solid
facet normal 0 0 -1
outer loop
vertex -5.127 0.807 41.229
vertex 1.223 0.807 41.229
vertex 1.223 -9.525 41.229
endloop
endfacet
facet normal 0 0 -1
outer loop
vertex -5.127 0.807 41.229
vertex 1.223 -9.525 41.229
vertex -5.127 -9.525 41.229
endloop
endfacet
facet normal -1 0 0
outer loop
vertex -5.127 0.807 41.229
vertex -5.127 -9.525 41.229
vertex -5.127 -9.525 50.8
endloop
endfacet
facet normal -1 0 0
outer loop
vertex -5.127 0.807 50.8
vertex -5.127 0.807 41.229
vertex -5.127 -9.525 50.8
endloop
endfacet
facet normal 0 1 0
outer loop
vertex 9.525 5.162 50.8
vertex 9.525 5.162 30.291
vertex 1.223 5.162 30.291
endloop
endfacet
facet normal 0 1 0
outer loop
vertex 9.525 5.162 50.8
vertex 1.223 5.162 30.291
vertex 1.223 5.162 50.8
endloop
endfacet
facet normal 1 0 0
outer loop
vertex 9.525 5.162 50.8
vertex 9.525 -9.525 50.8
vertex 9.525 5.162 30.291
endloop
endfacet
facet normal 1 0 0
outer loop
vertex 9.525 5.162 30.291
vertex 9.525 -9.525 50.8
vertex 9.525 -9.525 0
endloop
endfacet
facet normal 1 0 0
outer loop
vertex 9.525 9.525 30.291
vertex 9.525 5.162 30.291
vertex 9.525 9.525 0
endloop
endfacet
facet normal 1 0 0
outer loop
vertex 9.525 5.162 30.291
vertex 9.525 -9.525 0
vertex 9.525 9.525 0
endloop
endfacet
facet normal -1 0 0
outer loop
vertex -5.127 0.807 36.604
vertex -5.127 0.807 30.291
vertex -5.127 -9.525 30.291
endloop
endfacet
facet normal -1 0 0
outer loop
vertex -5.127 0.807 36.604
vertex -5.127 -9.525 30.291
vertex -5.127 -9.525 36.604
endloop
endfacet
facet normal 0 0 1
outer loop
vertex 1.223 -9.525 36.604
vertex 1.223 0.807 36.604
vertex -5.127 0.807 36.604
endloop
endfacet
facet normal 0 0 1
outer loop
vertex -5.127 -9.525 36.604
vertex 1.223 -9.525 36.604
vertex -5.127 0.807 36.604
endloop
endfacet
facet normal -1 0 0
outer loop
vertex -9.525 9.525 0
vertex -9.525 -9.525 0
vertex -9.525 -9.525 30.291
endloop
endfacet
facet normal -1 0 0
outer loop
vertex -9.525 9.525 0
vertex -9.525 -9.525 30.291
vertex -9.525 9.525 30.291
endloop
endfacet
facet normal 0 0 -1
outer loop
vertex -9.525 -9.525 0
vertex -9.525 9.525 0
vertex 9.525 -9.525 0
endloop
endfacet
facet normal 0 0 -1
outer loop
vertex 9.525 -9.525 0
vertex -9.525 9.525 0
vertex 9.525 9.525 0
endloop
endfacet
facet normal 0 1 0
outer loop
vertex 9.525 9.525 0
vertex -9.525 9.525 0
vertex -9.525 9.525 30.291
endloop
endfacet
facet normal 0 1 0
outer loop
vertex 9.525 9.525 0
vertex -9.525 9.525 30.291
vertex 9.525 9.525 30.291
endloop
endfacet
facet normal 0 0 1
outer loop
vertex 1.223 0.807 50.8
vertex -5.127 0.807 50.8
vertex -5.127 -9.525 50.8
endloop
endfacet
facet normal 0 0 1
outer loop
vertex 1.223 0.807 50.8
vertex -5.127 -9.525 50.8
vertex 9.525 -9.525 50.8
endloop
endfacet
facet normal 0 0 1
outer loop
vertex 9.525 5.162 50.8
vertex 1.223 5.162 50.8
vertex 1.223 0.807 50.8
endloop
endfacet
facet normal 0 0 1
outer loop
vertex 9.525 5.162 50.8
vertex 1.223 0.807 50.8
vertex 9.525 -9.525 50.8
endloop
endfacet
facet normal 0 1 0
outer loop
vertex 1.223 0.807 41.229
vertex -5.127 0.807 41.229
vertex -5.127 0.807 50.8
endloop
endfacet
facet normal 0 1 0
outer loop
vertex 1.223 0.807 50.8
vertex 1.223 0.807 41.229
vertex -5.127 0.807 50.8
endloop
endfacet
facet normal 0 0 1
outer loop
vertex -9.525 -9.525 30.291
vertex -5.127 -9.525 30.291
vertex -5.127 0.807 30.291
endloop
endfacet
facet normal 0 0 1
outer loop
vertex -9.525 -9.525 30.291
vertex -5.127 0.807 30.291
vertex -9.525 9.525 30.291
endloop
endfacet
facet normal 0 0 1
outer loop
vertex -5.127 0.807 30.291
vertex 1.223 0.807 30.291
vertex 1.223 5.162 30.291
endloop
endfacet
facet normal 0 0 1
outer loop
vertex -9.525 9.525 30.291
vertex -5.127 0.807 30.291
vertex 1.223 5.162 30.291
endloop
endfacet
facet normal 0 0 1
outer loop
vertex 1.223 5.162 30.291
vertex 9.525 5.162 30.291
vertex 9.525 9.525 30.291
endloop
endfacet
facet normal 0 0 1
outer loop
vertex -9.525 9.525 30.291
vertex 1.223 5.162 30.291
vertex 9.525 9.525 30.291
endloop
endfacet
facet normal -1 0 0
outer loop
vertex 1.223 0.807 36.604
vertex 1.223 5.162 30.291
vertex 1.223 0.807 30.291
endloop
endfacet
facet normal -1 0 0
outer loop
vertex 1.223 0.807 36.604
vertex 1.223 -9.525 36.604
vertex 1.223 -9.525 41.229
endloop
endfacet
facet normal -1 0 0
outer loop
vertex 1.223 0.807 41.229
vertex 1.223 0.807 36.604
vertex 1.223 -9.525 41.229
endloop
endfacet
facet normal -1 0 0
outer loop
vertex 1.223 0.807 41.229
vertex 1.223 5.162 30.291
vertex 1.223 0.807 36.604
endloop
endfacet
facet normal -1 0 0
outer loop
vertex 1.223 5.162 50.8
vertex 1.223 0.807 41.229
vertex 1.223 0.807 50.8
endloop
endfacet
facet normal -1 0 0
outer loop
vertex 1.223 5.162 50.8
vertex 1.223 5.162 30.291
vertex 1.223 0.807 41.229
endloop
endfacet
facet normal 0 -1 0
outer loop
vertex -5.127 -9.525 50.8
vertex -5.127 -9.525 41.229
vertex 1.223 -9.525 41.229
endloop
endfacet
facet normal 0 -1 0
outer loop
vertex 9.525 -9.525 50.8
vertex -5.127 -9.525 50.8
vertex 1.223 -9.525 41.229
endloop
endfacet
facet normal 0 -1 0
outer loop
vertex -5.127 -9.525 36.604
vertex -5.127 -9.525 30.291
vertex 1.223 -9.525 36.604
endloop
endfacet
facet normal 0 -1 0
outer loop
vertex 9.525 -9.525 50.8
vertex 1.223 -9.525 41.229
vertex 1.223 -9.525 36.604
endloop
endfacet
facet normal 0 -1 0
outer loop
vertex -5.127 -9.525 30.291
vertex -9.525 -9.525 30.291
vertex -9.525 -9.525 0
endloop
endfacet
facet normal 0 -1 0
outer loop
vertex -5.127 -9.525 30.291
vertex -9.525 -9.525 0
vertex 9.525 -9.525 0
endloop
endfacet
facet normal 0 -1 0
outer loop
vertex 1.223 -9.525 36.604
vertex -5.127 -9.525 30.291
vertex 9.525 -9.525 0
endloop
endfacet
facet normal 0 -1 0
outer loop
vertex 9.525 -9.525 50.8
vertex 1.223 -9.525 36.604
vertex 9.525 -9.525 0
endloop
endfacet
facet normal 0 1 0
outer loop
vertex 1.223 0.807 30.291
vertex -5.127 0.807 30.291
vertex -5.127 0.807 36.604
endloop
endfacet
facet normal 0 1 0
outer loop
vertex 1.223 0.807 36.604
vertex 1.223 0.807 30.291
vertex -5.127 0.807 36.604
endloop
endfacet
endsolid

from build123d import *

# Parameters (mm, degrees)
F0_W     = 19.05
F0_H     = 19.05
F1_DEPTH = 50.8
F2_W     = 4.3630654678
F2_H     = 20.508804819
F3_DEPTH = 25.4
F4_W     = 4.3975393042
F4_H     = 20.508804819
F5_DEPTH = 25.4
F6_W     = 4.3544375803
F6_H     = 20.508804819
F7_DEPTH = 6.35
F8_W     = 6.35
F8_H     = 4.6250596642
F9_DEPTH = 25.4


# Not quite as in the source:
# - a feature names something its author has since deleted; it is built from what else it names


with BuildPart() as f1:
    # F0 (on Top) → F1 (new body)
    with BuildSketch(Plane.XY):
        Rectangle(F0_W, F0_H)
    extrude(amount=F1_DEPTH)

    # F2 (on face) → F3 (cut)
    with BuildSketch(Plane.YZ.offset(9.525)):
        with Locations((7.3434672661, 40.5455975905)):
            Rectangle(F2_W, F2_H)
    extrude(amount=-F3_DEPTH, mode=Mode.SUBTRACT)

    # F4 (on face) → F5 (cut)
    with BuildSketch(Plane(origin=(0, 5.1619345322, 0), x_dir=(-1, 0, 0), z_dir=(0, 1, 0))):
        with Locations((7.3262303479, 40.5455975905)):
            Rectangle(F4_W, F4_H)
    extrude(amount=-F5_DEPTH, mode=Mode.SUBTRACT)

    # F6 (on face) → F7 (cut)
    with BuildSketch(Plane(origin=(-5.1274606958, 0, 0), x_dir=(0, -1, 0), z_dir=(-1, 0, 0))):
        with Locations((-2.9847157421, 40.5455975905)):
            Rectangle(F6_W, F6_H)
    extrude(amount=-F7_DEPTH, mode=Mode.SUBTRACT)

    # F8 (on face) → F9 (cut)
    with BuildSketch(Plane(origin=(0, 0.8074969519, 0), x_dir=(-1, 0, 0), z_dir=(0, 1, 0))):
        with Locations((1.9524606958, 38.9165244997)):
            Rectangle(F8_W, F8_H)
    extrude(amount=-F9_DEPTH, mode=Mode.SUBTRACT)


solid = f1.part
